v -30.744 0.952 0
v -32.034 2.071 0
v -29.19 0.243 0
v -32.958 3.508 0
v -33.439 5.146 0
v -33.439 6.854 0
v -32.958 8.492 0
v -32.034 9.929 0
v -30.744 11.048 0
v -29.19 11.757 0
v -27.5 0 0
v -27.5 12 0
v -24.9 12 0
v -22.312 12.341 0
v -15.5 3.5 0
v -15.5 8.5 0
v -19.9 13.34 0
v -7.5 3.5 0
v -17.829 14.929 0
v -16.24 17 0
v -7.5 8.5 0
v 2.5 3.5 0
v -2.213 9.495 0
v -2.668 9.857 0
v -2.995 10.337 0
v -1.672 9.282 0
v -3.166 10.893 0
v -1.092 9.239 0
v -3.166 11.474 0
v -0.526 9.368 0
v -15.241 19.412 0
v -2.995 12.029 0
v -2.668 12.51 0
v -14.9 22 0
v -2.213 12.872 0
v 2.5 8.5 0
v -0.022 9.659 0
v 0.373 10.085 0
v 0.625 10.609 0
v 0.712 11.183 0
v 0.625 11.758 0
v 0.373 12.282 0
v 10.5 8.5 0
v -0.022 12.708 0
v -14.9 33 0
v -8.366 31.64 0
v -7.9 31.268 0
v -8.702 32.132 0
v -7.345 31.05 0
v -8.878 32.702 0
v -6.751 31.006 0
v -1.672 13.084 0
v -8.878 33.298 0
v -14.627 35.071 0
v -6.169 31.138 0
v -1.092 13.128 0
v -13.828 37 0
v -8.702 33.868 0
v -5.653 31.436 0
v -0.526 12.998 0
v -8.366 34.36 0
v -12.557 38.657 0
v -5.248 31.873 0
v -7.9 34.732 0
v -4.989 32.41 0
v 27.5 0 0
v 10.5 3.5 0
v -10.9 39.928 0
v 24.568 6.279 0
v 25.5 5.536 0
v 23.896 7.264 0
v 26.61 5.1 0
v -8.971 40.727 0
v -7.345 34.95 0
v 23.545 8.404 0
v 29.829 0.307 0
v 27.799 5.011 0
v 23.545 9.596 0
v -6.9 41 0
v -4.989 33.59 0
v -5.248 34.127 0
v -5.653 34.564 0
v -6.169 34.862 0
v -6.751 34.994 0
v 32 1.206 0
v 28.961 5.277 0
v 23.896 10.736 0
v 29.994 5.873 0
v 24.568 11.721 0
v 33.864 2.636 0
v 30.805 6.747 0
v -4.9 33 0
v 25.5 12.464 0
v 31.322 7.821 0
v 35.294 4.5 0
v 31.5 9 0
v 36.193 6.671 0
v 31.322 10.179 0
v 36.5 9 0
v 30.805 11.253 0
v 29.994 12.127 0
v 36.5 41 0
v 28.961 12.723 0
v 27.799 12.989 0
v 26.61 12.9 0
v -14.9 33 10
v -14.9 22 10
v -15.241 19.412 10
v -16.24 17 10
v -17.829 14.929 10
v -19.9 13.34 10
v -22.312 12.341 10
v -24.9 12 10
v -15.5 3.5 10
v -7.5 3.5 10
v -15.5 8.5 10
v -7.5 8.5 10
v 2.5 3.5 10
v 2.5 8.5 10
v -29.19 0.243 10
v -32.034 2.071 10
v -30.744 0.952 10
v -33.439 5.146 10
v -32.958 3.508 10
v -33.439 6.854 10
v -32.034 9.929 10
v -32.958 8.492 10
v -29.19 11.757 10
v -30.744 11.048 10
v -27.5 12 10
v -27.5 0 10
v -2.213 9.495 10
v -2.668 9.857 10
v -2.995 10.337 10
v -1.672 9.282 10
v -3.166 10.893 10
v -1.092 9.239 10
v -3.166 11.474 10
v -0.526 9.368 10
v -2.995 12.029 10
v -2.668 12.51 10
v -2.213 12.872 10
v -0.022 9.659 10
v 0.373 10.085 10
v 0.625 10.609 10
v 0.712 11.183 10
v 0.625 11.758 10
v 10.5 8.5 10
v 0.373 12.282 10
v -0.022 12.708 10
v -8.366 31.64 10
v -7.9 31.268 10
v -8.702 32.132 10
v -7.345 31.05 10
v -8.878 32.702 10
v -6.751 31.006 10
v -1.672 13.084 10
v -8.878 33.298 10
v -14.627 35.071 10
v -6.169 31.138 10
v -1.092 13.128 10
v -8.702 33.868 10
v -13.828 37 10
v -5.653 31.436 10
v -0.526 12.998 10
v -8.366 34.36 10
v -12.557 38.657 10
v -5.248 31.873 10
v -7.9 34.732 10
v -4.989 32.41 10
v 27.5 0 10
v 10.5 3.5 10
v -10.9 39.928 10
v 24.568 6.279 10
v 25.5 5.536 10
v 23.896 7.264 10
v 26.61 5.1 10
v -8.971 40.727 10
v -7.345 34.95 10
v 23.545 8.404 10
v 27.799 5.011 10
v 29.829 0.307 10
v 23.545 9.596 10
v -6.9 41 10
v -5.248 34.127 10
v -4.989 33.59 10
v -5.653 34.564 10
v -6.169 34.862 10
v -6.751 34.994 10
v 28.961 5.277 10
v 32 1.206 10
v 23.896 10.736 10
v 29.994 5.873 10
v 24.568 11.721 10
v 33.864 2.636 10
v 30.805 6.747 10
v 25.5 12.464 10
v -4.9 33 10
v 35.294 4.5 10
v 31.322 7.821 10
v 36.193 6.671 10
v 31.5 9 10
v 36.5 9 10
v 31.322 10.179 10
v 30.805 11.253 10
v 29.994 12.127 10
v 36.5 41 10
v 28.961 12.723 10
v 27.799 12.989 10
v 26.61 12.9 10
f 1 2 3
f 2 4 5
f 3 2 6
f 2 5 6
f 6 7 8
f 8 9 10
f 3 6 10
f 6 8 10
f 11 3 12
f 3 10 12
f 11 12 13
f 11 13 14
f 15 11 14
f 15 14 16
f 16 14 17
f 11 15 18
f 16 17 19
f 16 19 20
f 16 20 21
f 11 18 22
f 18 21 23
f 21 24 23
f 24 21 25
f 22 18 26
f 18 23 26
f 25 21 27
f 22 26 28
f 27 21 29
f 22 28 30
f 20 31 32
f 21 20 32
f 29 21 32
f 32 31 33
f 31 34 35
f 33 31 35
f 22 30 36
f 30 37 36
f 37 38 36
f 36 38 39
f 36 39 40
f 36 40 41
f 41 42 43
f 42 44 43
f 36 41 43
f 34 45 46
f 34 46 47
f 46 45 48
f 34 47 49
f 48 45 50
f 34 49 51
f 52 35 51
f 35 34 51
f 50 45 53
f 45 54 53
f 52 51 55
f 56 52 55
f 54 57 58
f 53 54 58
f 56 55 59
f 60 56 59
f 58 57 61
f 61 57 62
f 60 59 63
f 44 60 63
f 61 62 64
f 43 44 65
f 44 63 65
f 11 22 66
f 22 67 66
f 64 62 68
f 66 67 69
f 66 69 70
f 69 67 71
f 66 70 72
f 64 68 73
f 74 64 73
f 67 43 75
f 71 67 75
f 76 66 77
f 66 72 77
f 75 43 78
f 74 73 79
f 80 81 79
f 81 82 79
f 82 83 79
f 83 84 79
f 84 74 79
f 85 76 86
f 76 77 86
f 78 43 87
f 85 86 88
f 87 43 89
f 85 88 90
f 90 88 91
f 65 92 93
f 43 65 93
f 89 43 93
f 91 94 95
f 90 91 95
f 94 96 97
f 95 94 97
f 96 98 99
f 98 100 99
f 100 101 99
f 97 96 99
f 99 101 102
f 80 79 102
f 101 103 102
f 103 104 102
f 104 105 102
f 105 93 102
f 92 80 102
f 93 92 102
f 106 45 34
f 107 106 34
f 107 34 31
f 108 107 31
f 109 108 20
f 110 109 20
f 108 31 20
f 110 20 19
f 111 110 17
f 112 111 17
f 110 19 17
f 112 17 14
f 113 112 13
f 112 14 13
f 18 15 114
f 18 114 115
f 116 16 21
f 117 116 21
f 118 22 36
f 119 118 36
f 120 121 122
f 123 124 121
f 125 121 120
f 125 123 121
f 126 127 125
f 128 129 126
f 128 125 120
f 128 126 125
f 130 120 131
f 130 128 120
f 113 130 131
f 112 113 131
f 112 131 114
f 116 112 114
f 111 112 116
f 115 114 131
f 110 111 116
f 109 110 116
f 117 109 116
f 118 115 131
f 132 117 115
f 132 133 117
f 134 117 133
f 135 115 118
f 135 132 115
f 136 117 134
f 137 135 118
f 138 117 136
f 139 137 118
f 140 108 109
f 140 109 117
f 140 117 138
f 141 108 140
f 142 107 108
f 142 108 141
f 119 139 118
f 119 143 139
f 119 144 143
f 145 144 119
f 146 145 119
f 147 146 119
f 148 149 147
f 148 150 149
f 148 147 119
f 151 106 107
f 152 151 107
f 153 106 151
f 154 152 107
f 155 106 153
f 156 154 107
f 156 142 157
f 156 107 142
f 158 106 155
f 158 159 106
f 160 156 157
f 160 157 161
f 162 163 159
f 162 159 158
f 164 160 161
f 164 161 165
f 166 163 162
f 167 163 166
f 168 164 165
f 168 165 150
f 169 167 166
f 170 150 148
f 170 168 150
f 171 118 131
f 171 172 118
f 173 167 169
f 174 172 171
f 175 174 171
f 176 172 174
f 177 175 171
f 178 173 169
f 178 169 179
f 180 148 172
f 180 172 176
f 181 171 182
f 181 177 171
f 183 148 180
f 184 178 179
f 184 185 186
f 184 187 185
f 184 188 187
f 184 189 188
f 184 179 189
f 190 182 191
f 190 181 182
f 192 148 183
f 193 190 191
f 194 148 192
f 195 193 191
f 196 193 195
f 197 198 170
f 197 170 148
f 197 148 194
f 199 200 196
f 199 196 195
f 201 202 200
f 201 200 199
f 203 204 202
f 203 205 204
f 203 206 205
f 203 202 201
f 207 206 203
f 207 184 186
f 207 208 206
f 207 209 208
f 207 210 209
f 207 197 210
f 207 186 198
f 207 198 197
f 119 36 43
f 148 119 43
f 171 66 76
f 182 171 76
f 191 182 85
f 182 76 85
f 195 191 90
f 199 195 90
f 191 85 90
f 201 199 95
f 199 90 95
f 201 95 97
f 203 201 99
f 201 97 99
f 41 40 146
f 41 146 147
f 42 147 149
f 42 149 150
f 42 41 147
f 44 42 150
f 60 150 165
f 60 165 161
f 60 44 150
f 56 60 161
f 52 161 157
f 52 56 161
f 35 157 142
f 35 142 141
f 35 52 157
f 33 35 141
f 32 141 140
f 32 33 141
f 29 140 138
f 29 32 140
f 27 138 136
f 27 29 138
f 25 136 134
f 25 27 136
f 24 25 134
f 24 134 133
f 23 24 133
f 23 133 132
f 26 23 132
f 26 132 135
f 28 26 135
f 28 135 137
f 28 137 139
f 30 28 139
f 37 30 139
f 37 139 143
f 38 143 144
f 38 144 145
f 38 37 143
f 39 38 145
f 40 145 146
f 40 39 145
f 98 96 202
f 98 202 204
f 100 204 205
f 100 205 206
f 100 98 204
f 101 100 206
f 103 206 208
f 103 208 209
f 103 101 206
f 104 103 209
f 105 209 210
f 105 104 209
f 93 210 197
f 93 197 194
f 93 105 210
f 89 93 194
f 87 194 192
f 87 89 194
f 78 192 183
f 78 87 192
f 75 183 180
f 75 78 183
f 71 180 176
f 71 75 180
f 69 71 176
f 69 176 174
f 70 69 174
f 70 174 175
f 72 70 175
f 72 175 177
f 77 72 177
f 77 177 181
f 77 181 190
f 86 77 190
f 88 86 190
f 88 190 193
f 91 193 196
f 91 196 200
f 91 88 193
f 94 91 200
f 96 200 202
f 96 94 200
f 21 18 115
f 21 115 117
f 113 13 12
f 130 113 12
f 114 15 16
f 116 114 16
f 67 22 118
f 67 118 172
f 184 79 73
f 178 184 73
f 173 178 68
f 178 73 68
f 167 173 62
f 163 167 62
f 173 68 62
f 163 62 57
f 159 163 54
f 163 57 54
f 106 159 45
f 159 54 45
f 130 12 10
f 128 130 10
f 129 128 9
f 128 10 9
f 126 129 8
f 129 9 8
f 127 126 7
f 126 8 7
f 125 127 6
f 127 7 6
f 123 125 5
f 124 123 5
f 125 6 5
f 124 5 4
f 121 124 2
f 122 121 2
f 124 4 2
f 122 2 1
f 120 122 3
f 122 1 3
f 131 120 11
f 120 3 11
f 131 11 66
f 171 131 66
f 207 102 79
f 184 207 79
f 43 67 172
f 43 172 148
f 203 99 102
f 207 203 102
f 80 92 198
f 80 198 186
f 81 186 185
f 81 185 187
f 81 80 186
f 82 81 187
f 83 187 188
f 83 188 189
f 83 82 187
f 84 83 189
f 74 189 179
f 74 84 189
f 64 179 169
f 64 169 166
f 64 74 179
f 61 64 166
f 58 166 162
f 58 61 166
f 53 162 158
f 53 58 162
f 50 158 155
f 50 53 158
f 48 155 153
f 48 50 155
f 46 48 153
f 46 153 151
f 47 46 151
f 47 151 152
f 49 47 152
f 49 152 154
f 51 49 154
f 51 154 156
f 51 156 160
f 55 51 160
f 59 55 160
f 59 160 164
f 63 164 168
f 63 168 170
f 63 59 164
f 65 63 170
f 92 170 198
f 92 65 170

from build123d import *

# Parameters (mm, degrees)
SKETCH_1_W          = 8
SKETCH_1_H          = 5
SKETCH_1_R          = 1.949999999
SKETCH_1_R_2        = 4
SKETCH_1_R_3        = 2
BOSS_EXTRUDE1_DEPTH = 10


with BuildPart() as part:
    # Sketch 1 → Boss-Extrude1 (new body)
    with BuildSketch(Plane.XY):
        with BuildLine():
            ThreePointArc((27.5, 18), (33.863961031, 15.363961031), (36.5, 9))
            Line((36.5, 9), (36.5, 41))
            Line((36.5, 41), (-6.9, 41))
            ThreePointArc((-6.9, 41), (-1.243145751, 38.656854249), (1.1, 33))
            Line((1.1, 33), (1.1, 28))
            ThreePointArc((1.1, 28), (4.028932188, 20.928932188), (11.1, 18))
            Line((11.1, 18), (27.5, 18))
        make_face()
        with BuildLine():
            ThreePointArc((-27.5, 12), (-33.5, 6), (-27.5, 0))
            Line((-27.5, 0), (27.5, 0))
            ThreePointArc((27.5, 0), (33.863961031, 2.636038969), (36.5, 9))
            ThreePointArc((36.5, 9), (33.863961031, 15.363961031), (27.5, 18))
            Line((27.5, 18), (11.1, 18))
            ThreePointArc((11.1, 18), (4.028932188, 20.928932188), (1.1, 28))
            Line((1.1, 28), (1.1, 33))
            ThreePointArc((1.1, 33), (-1.243145751, 38.656854249), (-6.9, 41))
            ThreePointArc((-6.9, 41), (-12.556854249, 38.656854249), (-14.9, 33))
            Line((-14.9, 33), (-14.9, 22))
            ThreePointArc((-14.9, 22), (-17.828932188, 14.928932188), (-24.9, 12))
            Line((-24.9, 12), (-27.5, 12))
        make_face()
        with Locations((-11.5, 6)):
            Rectangle(SKETCH_1_W, SKETCH_1_H, mode=Mode.SUBTRACT)
        with Locations((-1.238171752, 11.18329463)):
            Circle(SKETCH_1_R, mode=Mode.SUBTRACT)
        with Locations((6.5, 6)):
            Rectangle(SKETCH_1_W, SKETCH_1_H, mode=Mode.SUBTRACT)
        with Locations((27.5, 9)):
            Circle(SKETCH_1_R_2, mode=Mode.SUBTRACT)
        with Locations((-6.9, 33)):
            Circle(SKETCH_1_R_3, mode=Mode.SUBTRACT)
    extrude(amount=BOSS_EXTRUDE1_DEPTH)


solid = part.part
